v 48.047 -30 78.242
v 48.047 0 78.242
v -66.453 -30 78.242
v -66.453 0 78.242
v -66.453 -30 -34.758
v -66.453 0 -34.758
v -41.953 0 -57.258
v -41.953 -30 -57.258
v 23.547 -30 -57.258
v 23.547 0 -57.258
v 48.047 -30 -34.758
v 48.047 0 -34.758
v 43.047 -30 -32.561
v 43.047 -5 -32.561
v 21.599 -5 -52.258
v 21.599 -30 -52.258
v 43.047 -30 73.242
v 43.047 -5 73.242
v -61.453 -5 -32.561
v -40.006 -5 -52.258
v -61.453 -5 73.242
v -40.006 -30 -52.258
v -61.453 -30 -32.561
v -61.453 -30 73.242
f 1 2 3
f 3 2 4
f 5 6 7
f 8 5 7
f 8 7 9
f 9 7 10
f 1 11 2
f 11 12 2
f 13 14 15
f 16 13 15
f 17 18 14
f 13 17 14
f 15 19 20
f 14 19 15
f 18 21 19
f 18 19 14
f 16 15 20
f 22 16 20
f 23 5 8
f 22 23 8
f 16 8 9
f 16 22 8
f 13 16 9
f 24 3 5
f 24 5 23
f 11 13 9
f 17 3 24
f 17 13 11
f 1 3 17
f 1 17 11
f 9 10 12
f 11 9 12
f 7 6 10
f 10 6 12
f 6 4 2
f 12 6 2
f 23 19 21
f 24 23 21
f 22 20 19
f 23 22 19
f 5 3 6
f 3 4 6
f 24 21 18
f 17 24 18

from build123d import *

# Parameters (mm, degrees)
F1_DEPTH = 5
F3_DEPTH = 25


with BuildPart() as f1:
    # F0 (on Front) → F1 (new body)
    with BuildSketch(Plane.XZ):
        Polygon((48.04658, 78.242314), (-66.45342, 78.242314), (-66.45342, -34.757686), (-41.95342, -57.257686), (23.54658, -57.257686), (48.04658, -34.757686), align=None)
    extrude(amount=F1_DEPTH)

    # F2 (on face) → F3 (join)
    with BuildSketch(Plane.XZ.offset(5)):
        Polygon((23.54658, -57.257686), (48.04658, -34.757686), (48.04658, 78.242314), (-66.45342, 78.242314), (-66.45342, -34.757686), (-41.95342, -57.257686), align=None)
        Polygon((-61.45342, -32.560932), (-61.45342, 73.242314), (43.04658, 73.242314), (43.04658, -32.560932), (21.599003, -52.257686), (-40.005844, -52.257686), align=None, mode=Mode.SUBTRACT)
    extrude(amount=F3_DEPTH)


solid = f1.part
